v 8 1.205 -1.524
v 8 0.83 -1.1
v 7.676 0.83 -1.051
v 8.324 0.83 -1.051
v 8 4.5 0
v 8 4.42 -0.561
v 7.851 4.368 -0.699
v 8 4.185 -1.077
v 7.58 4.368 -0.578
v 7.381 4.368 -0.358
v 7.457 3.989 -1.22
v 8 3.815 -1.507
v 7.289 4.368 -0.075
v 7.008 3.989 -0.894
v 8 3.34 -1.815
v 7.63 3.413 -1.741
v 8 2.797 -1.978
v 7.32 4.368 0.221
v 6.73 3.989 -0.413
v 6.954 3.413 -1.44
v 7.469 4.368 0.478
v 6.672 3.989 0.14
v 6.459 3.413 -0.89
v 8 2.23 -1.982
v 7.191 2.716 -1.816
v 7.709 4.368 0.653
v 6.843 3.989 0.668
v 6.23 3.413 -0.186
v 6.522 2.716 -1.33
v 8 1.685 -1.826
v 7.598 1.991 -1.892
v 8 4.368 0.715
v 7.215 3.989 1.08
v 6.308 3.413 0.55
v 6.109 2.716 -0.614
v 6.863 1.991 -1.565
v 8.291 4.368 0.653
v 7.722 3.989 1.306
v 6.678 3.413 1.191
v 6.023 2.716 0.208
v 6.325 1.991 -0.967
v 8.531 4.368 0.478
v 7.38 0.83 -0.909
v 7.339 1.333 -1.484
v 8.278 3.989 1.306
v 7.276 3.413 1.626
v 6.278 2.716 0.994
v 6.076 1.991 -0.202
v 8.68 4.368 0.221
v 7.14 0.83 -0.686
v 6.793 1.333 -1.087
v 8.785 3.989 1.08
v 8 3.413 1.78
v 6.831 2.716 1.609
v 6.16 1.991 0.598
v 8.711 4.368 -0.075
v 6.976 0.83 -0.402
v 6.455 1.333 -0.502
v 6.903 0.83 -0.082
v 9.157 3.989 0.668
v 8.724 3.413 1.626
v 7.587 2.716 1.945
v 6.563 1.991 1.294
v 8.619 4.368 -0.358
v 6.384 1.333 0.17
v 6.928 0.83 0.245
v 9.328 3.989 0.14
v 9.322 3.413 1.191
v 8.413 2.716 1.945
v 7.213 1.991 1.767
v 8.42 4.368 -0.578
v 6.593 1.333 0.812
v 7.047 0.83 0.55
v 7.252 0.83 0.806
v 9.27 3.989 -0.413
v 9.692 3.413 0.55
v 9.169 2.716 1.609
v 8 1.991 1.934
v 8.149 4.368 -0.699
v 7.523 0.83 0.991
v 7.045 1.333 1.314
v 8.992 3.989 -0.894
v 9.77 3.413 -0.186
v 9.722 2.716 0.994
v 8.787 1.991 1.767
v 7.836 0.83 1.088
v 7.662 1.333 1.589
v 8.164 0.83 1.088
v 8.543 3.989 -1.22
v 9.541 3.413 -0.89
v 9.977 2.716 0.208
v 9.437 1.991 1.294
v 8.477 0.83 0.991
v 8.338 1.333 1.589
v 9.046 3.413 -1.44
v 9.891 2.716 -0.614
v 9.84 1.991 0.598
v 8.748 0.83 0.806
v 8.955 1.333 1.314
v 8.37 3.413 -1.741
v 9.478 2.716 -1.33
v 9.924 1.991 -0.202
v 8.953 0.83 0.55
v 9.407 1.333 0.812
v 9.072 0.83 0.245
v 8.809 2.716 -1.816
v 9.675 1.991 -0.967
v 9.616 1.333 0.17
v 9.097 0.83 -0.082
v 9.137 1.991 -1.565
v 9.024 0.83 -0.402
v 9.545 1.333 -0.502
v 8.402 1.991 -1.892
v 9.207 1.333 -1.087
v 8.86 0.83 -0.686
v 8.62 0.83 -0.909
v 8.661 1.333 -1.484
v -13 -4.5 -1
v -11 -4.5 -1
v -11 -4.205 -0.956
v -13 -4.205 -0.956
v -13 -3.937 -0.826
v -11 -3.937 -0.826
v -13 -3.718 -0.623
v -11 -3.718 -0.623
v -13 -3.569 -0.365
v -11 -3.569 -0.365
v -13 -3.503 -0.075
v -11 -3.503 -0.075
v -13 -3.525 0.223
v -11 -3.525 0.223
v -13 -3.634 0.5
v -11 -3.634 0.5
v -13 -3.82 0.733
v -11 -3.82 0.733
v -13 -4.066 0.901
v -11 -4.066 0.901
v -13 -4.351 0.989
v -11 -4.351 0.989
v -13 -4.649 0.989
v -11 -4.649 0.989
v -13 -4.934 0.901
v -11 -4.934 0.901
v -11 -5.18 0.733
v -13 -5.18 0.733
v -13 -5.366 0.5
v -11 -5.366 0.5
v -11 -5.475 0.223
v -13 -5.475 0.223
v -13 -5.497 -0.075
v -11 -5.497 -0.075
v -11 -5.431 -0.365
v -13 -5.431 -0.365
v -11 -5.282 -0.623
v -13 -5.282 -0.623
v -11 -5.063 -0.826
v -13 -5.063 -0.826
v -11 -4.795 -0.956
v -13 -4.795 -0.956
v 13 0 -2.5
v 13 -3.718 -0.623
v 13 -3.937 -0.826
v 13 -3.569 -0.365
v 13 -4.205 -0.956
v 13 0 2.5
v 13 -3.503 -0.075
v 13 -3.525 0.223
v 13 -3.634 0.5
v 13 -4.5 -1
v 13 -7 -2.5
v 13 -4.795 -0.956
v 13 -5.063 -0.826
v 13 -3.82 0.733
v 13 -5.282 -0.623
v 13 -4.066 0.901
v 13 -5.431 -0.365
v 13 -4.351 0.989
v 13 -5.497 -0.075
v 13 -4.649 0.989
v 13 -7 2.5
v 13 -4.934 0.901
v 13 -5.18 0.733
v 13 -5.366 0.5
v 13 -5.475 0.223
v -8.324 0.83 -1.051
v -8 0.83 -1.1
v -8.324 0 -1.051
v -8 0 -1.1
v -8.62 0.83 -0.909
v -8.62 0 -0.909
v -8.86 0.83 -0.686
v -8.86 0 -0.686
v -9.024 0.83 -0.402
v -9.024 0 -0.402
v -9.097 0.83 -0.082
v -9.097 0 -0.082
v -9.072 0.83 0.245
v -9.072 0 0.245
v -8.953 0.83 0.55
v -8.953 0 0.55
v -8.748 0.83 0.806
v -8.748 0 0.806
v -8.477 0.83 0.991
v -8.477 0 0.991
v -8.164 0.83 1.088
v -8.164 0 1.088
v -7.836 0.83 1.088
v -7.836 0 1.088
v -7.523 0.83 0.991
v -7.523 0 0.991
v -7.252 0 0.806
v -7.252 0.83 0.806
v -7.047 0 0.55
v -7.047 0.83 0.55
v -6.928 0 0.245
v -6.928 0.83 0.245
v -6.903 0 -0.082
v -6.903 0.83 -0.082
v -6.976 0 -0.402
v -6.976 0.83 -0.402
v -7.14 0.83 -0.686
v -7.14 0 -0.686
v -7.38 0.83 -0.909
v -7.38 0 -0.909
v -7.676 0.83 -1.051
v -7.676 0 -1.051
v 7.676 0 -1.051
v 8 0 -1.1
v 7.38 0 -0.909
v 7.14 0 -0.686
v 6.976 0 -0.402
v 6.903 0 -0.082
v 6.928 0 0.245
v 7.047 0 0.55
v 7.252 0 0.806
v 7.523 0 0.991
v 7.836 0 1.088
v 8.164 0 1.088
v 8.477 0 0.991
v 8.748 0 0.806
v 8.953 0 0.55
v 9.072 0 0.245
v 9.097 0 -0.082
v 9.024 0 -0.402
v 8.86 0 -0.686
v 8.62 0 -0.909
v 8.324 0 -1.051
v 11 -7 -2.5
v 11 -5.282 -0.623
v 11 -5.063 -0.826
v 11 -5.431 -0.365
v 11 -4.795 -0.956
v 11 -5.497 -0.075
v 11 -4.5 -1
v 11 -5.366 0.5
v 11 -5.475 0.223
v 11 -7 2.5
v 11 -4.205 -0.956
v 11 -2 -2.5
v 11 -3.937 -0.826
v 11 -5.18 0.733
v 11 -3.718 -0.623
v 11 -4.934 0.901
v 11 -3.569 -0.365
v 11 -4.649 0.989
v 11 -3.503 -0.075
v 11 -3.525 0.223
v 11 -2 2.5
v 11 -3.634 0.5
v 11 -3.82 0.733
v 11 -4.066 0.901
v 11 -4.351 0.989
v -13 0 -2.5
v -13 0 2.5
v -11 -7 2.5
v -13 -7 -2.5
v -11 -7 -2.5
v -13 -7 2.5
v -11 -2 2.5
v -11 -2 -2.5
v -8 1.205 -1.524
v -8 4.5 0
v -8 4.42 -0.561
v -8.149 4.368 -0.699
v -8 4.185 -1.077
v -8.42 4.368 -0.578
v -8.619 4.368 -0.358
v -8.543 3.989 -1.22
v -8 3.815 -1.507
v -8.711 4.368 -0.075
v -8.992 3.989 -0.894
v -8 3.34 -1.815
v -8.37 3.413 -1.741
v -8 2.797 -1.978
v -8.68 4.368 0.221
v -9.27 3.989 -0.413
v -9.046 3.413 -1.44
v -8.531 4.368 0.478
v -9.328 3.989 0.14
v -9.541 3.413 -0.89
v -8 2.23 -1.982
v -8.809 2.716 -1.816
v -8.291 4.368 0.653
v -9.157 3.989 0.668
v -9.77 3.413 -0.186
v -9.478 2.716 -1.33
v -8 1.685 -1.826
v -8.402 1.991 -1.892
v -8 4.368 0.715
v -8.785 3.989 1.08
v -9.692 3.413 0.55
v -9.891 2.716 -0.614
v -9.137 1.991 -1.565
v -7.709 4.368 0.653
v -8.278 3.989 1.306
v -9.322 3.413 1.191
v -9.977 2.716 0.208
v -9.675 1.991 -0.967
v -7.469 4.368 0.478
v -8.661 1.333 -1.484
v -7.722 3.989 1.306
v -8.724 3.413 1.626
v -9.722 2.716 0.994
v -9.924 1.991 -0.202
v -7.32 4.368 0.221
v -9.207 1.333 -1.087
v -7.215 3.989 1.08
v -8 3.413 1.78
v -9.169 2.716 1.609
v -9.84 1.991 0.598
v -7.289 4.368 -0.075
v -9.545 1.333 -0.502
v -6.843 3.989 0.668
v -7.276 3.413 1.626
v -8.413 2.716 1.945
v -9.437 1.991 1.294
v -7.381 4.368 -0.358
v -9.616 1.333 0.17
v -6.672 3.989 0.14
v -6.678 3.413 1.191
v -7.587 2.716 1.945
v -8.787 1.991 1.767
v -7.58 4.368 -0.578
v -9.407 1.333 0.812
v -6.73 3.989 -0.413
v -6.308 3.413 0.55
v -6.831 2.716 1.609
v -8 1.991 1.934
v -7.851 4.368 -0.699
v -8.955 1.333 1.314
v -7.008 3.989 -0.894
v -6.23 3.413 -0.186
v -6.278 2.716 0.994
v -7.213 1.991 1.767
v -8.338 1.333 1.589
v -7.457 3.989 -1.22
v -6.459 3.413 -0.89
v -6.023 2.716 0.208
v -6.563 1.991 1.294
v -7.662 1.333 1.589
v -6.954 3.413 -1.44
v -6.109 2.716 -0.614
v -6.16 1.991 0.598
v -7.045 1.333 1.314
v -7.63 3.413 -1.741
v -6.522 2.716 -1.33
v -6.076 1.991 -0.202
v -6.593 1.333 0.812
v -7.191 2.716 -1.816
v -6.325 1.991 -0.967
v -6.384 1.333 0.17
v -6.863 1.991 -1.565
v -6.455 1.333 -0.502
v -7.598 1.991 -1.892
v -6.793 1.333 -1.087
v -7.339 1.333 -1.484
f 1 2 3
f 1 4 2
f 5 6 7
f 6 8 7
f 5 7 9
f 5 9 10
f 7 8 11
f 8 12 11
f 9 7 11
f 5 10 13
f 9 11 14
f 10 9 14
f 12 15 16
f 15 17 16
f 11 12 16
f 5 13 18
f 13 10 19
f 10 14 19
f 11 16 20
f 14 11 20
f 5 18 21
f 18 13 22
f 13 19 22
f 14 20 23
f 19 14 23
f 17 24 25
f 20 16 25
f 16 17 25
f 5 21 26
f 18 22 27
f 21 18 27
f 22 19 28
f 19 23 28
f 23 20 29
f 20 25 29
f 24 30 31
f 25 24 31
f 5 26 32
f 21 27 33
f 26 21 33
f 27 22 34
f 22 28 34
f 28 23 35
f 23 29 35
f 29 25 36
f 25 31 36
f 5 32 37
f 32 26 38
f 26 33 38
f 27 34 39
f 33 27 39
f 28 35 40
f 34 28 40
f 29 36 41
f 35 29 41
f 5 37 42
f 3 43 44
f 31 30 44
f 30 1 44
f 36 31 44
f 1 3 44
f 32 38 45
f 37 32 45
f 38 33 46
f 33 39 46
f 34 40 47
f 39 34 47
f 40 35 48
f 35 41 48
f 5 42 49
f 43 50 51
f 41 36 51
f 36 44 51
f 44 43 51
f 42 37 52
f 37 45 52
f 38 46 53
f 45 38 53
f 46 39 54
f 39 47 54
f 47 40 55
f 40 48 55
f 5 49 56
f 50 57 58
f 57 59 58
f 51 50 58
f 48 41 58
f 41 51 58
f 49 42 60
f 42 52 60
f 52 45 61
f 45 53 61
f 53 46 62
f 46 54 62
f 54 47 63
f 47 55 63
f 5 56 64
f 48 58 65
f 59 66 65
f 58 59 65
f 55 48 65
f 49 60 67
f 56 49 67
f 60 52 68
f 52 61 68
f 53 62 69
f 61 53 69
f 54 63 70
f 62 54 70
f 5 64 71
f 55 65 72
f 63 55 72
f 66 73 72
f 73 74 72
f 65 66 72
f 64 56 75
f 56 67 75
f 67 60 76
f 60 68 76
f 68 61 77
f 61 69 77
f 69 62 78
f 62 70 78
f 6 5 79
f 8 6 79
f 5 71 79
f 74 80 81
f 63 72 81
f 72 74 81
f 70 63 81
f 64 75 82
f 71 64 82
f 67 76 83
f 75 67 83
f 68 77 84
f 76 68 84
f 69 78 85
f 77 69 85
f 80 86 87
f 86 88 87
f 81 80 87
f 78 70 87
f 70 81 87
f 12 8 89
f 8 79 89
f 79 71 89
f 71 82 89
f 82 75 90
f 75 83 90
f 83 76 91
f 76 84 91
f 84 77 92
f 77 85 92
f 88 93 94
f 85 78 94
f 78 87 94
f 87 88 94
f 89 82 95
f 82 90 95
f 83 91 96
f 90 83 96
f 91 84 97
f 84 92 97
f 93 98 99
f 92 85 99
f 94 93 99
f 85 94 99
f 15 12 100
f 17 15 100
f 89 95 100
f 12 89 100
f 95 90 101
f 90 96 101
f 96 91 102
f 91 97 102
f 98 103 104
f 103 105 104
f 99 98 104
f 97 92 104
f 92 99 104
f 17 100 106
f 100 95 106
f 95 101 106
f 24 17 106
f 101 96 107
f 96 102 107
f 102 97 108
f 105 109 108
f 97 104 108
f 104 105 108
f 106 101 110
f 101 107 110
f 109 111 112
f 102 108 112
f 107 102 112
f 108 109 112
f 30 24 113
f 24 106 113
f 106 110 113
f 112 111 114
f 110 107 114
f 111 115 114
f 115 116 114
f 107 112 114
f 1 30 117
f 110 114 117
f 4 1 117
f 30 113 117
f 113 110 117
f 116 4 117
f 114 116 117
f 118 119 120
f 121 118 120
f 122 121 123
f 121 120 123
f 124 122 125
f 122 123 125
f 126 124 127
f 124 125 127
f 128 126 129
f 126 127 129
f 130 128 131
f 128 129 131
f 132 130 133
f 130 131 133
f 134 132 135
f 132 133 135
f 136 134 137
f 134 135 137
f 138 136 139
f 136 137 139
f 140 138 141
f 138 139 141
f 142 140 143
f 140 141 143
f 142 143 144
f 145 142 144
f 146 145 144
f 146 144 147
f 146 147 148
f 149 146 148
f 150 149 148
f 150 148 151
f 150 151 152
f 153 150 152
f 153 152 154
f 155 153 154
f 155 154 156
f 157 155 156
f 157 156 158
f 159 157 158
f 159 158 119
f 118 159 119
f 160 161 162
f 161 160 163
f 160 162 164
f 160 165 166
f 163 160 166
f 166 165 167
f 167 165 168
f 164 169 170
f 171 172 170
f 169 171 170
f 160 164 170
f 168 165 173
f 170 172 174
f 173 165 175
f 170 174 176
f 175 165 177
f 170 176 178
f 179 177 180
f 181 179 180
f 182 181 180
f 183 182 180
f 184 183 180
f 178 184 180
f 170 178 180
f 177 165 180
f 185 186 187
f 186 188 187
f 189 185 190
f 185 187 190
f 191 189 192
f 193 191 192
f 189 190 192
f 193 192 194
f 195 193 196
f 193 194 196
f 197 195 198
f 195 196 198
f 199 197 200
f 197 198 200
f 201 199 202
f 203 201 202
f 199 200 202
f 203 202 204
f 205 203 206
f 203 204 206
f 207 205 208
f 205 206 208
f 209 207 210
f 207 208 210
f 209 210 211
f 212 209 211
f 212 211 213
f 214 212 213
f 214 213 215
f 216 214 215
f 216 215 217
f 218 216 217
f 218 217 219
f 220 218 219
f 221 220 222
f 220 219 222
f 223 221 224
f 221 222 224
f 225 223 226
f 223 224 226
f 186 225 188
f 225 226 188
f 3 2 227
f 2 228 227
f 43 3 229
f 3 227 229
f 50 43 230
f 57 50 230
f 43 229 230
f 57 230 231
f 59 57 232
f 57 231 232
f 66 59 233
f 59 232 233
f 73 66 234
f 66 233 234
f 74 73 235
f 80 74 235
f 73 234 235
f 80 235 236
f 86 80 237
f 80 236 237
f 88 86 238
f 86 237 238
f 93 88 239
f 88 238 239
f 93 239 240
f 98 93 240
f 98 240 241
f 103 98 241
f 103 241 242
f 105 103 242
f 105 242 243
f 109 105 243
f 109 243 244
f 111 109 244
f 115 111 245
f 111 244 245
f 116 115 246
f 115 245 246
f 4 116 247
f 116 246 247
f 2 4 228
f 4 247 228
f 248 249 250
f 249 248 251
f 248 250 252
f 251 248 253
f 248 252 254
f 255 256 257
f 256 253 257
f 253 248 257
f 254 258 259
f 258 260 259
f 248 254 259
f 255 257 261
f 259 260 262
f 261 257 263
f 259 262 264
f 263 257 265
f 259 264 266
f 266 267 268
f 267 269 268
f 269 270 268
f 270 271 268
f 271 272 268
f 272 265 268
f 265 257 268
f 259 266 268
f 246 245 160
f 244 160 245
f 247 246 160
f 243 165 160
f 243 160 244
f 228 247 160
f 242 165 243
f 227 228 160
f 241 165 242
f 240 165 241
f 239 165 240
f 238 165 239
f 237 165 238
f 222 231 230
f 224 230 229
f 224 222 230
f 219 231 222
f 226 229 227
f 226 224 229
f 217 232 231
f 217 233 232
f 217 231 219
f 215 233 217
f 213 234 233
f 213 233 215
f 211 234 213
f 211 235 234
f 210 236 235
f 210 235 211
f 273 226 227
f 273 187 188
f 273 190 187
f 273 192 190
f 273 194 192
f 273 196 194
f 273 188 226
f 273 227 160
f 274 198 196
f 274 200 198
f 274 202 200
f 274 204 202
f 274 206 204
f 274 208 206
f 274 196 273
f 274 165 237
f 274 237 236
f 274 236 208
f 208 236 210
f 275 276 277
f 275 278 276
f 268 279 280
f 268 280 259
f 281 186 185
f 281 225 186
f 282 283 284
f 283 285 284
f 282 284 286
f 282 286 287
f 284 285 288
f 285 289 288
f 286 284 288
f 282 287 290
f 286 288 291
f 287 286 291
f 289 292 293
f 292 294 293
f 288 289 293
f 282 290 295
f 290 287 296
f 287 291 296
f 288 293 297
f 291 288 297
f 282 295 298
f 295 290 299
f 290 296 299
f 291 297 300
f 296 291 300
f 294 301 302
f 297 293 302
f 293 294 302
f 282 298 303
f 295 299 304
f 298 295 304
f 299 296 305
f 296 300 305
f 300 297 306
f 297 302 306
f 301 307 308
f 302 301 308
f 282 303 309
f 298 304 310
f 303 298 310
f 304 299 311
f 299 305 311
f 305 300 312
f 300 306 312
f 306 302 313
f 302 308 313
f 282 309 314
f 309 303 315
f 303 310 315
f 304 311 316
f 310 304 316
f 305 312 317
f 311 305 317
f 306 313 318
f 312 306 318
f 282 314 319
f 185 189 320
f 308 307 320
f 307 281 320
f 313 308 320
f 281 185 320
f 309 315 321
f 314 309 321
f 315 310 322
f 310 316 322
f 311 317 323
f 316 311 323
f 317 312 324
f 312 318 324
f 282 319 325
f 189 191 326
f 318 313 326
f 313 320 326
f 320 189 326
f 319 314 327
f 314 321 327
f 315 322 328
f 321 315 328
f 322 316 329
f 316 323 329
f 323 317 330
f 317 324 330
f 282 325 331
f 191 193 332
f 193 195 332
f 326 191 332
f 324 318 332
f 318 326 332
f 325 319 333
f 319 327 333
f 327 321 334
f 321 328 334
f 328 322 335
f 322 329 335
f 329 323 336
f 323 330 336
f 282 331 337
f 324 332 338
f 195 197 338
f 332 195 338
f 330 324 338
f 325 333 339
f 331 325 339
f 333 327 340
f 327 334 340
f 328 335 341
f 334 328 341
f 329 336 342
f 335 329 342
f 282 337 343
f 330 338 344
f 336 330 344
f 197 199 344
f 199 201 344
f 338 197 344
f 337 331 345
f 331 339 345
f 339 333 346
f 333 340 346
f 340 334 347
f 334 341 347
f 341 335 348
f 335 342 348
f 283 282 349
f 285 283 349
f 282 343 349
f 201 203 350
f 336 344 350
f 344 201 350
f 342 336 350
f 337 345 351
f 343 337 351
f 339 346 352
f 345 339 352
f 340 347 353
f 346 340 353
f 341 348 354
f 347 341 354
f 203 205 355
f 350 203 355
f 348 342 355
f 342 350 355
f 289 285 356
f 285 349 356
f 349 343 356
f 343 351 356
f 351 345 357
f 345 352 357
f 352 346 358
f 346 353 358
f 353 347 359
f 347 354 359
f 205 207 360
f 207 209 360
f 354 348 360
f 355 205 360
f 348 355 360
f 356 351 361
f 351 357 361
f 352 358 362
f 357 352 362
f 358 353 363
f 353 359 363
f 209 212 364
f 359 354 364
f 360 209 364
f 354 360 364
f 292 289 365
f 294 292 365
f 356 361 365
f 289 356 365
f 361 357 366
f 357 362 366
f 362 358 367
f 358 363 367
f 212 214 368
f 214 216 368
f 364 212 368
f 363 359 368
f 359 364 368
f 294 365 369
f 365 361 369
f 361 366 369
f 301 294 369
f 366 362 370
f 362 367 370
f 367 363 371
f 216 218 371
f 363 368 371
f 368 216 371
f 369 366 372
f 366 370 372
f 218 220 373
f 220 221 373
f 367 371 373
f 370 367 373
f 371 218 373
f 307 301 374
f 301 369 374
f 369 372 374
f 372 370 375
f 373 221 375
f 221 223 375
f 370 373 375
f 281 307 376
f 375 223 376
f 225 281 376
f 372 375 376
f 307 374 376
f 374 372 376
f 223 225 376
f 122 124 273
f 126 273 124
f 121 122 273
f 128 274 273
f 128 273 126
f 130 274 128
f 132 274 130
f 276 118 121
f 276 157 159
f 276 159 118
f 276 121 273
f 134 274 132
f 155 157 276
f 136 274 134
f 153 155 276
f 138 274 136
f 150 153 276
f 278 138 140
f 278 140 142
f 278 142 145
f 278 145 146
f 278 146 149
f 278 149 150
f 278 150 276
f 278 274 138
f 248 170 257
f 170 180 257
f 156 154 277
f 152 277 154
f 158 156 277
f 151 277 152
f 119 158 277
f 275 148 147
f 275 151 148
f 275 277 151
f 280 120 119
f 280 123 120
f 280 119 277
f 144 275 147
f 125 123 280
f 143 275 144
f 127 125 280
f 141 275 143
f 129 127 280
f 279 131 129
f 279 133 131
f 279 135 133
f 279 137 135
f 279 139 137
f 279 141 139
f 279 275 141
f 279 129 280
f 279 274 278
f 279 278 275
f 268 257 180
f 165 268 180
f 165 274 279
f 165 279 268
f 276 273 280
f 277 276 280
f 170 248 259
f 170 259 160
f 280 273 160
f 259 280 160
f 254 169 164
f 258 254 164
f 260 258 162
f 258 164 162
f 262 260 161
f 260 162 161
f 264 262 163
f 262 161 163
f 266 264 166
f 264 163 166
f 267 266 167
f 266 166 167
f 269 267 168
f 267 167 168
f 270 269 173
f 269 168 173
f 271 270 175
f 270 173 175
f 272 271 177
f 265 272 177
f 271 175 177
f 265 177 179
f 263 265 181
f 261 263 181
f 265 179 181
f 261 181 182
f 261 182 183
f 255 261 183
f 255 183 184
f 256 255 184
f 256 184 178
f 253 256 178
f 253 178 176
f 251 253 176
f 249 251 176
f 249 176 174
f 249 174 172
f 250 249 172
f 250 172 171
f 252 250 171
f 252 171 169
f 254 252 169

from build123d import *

# Parameters (mm, degrees)
EXTRUDE_1_DEPTH     = 2.5
SKETCH_2_R          = 1
CUT_EXTRUDE_1_DEPTH = 28.041634566


with BuildPart() as part:
    # 草图1 → 凸台-拉伸1 (new, symmetric)
    with BuildSketch(Plane.XY):
        Polygon((0, 0), (13, 0), (13, -7), (11, -7), (11, -2), (0, -2), align=None)
    extrude_1 = extrude(amount=EXTRUDE_1_DEPTH, both=True)

    # 镜向1: 凸台-拉伸1 across plane
    add(extrude_1.mirror(Plane(origin=(0, 0, 0), x_dir=(0, 0, 1), z_dir=(1, 0, 0))))

    # 草图2 → 切除-拉伸1 (cut, through all)
    with BuildSketch(Plane(origin=(13, 0, 0), x_dir=(0, 0, -1), z_dir=(1, 0, 0))):
        with Locations((0, -4.5)):
            Circle(SKETCH_2_R)
    extrude(amount=-CUT_EXTRUDE_1_DEPTH, mode=Mode.SUBTRACT)

    # 草图3 → 旋转1 (revolve)
    with BuildSketch(Plane(origin=(8, 0, 0), x_dir=(0, 0, -1), z_dir=(1, 0, 0))):
        with BuildLine():
            Line((0, 0), (0, 4.5))
            ThreePointArc((0, 4.5), (1.915810353, 3.074169567), (1.1, 0.829670691))
            Line((1.1, 0.829670691), (1.1, 0))
            Line((1.1, 0), (0, 0))
        make_face()
    revolve(axis=Axis((8, 0, 0), (0, 1, 0)))

    # 草图4 → 旋转2 (revolve)
    with BuildSketch(Plane.ZY.offset(8), mode=Mode.PRIVATE) as revolve_2_sk:
        with BuildLine():
            Line((0, 0), (0, 4.5))
            ThreePointArc((0, 4.5), (1.915810353, 3.074169567), (1.1, 0.829670691))
            Line((1.1, 0.829670691), (1.1, 0))
            Line((1.1, 0), (0, 0))
        make_face()
    revolve(revolve_2_sk.sketch.rotate(Axis((-8, 0, 0), (0, 1, 0)), 180), axis=Axis((-8, 0, 0), (0, 1, 0)))


solid = part.part
